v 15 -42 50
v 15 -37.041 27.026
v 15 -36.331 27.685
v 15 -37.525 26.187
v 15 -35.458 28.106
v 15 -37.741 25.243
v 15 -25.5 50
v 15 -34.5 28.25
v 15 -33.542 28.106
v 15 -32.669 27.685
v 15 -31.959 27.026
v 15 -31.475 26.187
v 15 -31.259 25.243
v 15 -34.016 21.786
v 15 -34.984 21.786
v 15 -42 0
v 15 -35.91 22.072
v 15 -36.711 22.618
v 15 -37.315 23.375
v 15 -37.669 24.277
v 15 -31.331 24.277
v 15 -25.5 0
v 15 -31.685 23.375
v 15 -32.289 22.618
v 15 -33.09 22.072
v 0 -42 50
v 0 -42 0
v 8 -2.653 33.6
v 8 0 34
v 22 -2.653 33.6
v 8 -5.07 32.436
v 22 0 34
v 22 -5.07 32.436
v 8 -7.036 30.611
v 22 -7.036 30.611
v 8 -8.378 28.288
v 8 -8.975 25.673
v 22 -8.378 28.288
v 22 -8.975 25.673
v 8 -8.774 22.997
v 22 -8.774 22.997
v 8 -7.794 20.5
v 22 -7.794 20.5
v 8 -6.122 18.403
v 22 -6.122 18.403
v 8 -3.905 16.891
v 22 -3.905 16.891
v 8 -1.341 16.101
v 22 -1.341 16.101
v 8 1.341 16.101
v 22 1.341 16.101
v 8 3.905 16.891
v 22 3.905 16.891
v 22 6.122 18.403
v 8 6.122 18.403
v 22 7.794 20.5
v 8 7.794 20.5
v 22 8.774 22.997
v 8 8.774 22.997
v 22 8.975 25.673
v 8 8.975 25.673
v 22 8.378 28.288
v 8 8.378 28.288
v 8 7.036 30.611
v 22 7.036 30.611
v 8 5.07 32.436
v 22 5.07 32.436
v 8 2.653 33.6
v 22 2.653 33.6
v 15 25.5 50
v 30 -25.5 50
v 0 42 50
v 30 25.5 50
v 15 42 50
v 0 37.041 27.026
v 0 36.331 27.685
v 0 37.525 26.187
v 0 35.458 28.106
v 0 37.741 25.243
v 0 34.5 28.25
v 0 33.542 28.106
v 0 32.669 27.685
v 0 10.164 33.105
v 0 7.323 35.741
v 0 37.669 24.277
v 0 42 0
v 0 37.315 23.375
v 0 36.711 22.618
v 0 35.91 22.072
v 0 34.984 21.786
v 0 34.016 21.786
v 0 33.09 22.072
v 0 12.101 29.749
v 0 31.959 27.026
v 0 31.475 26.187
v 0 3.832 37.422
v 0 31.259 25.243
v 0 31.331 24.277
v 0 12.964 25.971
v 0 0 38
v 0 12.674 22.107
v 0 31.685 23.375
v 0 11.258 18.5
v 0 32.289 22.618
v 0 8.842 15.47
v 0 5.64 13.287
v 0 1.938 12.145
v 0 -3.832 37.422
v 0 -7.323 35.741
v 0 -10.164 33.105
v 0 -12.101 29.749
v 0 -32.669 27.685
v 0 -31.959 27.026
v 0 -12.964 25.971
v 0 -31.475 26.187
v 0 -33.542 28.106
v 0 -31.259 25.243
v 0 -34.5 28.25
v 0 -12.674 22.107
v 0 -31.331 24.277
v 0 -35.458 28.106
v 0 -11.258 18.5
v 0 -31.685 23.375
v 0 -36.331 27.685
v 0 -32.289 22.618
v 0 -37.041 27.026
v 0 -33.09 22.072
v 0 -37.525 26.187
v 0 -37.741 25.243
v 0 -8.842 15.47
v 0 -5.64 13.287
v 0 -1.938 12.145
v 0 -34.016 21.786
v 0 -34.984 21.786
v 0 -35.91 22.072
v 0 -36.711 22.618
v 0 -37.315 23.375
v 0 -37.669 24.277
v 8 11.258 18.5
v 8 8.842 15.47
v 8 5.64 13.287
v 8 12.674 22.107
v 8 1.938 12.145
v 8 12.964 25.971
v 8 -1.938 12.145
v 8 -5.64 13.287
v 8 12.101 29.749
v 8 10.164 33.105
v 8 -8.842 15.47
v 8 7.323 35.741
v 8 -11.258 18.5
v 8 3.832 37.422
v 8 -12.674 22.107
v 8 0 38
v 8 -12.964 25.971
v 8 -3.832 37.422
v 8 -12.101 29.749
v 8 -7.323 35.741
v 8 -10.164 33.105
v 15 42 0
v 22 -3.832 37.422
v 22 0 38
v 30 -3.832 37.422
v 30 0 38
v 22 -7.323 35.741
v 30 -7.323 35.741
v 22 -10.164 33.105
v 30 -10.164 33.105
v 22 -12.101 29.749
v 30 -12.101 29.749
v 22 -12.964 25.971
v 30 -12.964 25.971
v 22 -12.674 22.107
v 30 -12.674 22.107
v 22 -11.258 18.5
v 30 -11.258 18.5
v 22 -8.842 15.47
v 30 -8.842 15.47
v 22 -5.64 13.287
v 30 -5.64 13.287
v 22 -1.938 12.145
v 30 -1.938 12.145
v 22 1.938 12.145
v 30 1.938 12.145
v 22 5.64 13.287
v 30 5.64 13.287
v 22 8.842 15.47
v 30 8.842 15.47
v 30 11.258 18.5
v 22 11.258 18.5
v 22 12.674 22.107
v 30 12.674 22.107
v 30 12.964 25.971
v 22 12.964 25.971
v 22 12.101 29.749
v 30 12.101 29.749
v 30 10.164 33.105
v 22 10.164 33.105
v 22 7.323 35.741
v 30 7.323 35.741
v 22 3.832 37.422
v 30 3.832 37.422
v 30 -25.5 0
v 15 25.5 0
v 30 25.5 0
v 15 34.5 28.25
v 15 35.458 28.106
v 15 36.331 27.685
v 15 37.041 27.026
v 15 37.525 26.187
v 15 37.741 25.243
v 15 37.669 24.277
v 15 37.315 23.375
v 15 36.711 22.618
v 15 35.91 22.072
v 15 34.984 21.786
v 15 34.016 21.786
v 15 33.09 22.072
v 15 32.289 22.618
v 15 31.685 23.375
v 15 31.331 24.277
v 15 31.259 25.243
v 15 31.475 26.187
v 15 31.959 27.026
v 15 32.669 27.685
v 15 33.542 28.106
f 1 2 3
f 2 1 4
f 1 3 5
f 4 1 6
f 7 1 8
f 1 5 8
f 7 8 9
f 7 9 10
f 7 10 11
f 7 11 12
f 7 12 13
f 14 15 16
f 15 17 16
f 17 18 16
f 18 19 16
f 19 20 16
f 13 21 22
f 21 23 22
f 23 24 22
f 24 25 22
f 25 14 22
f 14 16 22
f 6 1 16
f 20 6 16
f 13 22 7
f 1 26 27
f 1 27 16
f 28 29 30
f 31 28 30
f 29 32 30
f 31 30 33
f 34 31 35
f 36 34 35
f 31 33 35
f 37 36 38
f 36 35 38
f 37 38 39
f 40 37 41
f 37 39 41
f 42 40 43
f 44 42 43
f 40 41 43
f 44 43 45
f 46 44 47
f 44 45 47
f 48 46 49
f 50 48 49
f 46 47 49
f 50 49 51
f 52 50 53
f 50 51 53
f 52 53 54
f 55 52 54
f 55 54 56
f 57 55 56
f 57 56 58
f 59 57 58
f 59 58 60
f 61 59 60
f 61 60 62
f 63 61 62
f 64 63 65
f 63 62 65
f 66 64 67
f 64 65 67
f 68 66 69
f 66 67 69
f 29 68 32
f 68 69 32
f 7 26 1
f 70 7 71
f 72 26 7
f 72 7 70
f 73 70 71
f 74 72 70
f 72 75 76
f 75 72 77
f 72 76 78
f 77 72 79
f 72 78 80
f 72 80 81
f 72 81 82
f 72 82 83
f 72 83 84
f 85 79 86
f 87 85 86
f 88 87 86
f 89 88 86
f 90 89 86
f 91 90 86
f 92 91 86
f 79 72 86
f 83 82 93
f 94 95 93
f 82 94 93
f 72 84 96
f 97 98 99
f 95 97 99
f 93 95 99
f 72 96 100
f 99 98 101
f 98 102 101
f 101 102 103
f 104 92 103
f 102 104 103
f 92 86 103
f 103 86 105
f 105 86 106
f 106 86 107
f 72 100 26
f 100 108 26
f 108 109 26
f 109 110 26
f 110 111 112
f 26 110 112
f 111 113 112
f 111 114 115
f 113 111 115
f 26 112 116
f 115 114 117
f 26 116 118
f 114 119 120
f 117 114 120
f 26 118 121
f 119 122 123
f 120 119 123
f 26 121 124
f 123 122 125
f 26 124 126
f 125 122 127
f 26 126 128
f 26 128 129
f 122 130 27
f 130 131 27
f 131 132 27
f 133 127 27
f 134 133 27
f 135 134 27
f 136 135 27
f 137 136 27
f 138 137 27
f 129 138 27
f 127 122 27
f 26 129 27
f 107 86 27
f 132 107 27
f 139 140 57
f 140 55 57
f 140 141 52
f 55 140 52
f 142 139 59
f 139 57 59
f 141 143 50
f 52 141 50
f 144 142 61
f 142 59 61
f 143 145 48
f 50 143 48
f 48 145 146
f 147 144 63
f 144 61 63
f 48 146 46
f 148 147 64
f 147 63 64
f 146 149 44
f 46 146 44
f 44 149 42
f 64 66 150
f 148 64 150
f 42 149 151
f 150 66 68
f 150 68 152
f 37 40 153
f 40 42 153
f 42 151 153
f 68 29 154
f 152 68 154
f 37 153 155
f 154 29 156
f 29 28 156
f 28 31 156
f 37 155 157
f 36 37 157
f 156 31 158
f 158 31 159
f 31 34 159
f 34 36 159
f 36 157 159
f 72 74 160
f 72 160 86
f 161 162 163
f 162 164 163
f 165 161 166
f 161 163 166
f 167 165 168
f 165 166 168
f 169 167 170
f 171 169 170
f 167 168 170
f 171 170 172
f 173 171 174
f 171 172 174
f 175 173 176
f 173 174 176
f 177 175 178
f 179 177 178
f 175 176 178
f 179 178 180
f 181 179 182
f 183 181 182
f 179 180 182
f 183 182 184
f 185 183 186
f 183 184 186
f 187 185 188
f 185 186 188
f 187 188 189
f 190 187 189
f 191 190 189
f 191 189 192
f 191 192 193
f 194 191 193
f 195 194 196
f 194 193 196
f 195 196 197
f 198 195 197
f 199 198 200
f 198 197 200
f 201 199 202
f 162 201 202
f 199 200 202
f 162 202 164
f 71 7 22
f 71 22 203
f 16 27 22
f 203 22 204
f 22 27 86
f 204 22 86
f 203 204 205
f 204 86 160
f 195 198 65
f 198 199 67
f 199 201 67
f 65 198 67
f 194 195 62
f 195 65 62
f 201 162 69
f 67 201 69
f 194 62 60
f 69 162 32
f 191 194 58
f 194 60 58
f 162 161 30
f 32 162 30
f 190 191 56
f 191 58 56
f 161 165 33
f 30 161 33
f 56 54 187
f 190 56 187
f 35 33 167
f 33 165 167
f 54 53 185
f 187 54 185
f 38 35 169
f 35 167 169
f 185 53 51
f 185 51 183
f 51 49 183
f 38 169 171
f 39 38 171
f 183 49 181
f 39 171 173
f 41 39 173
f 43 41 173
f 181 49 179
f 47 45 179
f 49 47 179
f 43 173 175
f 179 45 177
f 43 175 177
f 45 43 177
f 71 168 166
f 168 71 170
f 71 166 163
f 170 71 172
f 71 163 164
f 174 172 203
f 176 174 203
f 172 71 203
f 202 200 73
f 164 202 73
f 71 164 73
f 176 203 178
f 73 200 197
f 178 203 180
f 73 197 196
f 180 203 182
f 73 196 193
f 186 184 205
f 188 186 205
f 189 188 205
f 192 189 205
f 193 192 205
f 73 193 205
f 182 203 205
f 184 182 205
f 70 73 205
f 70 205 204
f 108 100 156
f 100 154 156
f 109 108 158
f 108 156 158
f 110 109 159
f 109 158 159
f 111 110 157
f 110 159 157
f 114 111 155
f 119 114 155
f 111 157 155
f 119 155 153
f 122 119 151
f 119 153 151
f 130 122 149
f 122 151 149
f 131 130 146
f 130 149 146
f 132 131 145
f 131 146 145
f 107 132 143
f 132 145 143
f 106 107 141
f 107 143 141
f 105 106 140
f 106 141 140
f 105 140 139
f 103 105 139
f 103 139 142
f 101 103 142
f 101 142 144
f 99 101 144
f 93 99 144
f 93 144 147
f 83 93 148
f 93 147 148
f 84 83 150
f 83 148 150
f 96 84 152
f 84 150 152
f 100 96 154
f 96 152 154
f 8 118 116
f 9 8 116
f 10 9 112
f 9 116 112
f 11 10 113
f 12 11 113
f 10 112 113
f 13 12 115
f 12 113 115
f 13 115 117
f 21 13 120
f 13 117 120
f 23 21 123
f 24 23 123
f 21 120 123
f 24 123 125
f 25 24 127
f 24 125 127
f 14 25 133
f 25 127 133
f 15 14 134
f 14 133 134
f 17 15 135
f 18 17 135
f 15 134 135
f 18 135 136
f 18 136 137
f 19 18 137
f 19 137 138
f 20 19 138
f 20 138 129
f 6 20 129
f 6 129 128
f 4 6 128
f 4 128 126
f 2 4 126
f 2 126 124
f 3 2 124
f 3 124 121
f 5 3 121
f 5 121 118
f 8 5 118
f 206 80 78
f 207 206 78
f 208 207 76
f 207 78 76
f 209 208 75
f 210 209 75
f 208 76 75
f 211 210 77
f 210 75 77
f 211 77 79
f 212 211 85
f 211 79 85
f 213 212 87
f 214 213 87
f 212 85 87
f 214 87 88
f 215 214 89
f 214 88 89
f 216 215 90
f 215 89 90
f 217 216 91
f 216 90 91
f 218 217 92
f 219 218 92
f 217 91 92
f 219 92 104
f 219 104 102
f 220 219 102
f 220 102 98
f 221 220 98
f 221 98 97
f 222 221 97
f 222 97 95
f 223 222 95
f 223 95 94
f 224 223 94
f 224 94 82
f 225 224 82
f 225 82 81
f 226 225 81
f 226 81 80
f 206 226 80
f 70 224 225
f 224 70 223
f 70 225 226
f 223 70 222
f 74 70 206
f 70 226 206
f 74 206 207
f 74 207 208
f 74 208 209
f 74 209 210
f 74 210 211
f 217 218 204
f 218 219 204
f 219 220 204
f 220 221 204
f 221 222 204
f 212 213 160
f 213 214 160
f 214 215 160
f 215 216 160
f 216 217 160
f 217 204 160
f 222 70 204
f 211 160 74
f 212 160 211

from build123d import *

# Parameters (mm, degrees)
BOSS_EXTRUDE1_DEPTH        = 50
F_6_5_6_5_DIAMETER_HOLE1_D = 6.5


with BuildPart() as part:
    # Sketch1 → Boss-Extrude1 (new body)
    with BuildSketch(Plane.XY):
        Polygon((0, 42), (0, -42), (15, -42), (15, -25.5), (30, -25.5), (30, 25.5), (15, 25.5), (15, 42), align=None)
    extrude(amount=BOSS_EXTRUDE1_DEPTH)

    # Ø6.5 (6.5) Diameter Hole1 (through all)
    with Locations(Plane(origin=(15, 0, 0), x_dir=(0, 0, -1), z_dir=(1, 0, 0))):
        with Locations((-25, -34.5), (-25, 34.5)):
            Hole(F_6_5_6_5_DIAMETER_HOLE1_D / 2)

    # Sketch4 → Cut-Revolve1 (revolve, cut)
    with BuildSketch(Plane(origin=(0, 0, 0), x_dir=(1, 0, 0), z_dir=(0, 1, 0))):
        Polygon((0, -25), (0, -38), (8, -38), (8, -34), (22, -34), (22, -38), (30, -38), (30, -25), align=None)
    revolve(axis=Axis((0, 0, 25), (1, 0, 0)), mode=Mode.SUBTRACT)


solid = part.part
